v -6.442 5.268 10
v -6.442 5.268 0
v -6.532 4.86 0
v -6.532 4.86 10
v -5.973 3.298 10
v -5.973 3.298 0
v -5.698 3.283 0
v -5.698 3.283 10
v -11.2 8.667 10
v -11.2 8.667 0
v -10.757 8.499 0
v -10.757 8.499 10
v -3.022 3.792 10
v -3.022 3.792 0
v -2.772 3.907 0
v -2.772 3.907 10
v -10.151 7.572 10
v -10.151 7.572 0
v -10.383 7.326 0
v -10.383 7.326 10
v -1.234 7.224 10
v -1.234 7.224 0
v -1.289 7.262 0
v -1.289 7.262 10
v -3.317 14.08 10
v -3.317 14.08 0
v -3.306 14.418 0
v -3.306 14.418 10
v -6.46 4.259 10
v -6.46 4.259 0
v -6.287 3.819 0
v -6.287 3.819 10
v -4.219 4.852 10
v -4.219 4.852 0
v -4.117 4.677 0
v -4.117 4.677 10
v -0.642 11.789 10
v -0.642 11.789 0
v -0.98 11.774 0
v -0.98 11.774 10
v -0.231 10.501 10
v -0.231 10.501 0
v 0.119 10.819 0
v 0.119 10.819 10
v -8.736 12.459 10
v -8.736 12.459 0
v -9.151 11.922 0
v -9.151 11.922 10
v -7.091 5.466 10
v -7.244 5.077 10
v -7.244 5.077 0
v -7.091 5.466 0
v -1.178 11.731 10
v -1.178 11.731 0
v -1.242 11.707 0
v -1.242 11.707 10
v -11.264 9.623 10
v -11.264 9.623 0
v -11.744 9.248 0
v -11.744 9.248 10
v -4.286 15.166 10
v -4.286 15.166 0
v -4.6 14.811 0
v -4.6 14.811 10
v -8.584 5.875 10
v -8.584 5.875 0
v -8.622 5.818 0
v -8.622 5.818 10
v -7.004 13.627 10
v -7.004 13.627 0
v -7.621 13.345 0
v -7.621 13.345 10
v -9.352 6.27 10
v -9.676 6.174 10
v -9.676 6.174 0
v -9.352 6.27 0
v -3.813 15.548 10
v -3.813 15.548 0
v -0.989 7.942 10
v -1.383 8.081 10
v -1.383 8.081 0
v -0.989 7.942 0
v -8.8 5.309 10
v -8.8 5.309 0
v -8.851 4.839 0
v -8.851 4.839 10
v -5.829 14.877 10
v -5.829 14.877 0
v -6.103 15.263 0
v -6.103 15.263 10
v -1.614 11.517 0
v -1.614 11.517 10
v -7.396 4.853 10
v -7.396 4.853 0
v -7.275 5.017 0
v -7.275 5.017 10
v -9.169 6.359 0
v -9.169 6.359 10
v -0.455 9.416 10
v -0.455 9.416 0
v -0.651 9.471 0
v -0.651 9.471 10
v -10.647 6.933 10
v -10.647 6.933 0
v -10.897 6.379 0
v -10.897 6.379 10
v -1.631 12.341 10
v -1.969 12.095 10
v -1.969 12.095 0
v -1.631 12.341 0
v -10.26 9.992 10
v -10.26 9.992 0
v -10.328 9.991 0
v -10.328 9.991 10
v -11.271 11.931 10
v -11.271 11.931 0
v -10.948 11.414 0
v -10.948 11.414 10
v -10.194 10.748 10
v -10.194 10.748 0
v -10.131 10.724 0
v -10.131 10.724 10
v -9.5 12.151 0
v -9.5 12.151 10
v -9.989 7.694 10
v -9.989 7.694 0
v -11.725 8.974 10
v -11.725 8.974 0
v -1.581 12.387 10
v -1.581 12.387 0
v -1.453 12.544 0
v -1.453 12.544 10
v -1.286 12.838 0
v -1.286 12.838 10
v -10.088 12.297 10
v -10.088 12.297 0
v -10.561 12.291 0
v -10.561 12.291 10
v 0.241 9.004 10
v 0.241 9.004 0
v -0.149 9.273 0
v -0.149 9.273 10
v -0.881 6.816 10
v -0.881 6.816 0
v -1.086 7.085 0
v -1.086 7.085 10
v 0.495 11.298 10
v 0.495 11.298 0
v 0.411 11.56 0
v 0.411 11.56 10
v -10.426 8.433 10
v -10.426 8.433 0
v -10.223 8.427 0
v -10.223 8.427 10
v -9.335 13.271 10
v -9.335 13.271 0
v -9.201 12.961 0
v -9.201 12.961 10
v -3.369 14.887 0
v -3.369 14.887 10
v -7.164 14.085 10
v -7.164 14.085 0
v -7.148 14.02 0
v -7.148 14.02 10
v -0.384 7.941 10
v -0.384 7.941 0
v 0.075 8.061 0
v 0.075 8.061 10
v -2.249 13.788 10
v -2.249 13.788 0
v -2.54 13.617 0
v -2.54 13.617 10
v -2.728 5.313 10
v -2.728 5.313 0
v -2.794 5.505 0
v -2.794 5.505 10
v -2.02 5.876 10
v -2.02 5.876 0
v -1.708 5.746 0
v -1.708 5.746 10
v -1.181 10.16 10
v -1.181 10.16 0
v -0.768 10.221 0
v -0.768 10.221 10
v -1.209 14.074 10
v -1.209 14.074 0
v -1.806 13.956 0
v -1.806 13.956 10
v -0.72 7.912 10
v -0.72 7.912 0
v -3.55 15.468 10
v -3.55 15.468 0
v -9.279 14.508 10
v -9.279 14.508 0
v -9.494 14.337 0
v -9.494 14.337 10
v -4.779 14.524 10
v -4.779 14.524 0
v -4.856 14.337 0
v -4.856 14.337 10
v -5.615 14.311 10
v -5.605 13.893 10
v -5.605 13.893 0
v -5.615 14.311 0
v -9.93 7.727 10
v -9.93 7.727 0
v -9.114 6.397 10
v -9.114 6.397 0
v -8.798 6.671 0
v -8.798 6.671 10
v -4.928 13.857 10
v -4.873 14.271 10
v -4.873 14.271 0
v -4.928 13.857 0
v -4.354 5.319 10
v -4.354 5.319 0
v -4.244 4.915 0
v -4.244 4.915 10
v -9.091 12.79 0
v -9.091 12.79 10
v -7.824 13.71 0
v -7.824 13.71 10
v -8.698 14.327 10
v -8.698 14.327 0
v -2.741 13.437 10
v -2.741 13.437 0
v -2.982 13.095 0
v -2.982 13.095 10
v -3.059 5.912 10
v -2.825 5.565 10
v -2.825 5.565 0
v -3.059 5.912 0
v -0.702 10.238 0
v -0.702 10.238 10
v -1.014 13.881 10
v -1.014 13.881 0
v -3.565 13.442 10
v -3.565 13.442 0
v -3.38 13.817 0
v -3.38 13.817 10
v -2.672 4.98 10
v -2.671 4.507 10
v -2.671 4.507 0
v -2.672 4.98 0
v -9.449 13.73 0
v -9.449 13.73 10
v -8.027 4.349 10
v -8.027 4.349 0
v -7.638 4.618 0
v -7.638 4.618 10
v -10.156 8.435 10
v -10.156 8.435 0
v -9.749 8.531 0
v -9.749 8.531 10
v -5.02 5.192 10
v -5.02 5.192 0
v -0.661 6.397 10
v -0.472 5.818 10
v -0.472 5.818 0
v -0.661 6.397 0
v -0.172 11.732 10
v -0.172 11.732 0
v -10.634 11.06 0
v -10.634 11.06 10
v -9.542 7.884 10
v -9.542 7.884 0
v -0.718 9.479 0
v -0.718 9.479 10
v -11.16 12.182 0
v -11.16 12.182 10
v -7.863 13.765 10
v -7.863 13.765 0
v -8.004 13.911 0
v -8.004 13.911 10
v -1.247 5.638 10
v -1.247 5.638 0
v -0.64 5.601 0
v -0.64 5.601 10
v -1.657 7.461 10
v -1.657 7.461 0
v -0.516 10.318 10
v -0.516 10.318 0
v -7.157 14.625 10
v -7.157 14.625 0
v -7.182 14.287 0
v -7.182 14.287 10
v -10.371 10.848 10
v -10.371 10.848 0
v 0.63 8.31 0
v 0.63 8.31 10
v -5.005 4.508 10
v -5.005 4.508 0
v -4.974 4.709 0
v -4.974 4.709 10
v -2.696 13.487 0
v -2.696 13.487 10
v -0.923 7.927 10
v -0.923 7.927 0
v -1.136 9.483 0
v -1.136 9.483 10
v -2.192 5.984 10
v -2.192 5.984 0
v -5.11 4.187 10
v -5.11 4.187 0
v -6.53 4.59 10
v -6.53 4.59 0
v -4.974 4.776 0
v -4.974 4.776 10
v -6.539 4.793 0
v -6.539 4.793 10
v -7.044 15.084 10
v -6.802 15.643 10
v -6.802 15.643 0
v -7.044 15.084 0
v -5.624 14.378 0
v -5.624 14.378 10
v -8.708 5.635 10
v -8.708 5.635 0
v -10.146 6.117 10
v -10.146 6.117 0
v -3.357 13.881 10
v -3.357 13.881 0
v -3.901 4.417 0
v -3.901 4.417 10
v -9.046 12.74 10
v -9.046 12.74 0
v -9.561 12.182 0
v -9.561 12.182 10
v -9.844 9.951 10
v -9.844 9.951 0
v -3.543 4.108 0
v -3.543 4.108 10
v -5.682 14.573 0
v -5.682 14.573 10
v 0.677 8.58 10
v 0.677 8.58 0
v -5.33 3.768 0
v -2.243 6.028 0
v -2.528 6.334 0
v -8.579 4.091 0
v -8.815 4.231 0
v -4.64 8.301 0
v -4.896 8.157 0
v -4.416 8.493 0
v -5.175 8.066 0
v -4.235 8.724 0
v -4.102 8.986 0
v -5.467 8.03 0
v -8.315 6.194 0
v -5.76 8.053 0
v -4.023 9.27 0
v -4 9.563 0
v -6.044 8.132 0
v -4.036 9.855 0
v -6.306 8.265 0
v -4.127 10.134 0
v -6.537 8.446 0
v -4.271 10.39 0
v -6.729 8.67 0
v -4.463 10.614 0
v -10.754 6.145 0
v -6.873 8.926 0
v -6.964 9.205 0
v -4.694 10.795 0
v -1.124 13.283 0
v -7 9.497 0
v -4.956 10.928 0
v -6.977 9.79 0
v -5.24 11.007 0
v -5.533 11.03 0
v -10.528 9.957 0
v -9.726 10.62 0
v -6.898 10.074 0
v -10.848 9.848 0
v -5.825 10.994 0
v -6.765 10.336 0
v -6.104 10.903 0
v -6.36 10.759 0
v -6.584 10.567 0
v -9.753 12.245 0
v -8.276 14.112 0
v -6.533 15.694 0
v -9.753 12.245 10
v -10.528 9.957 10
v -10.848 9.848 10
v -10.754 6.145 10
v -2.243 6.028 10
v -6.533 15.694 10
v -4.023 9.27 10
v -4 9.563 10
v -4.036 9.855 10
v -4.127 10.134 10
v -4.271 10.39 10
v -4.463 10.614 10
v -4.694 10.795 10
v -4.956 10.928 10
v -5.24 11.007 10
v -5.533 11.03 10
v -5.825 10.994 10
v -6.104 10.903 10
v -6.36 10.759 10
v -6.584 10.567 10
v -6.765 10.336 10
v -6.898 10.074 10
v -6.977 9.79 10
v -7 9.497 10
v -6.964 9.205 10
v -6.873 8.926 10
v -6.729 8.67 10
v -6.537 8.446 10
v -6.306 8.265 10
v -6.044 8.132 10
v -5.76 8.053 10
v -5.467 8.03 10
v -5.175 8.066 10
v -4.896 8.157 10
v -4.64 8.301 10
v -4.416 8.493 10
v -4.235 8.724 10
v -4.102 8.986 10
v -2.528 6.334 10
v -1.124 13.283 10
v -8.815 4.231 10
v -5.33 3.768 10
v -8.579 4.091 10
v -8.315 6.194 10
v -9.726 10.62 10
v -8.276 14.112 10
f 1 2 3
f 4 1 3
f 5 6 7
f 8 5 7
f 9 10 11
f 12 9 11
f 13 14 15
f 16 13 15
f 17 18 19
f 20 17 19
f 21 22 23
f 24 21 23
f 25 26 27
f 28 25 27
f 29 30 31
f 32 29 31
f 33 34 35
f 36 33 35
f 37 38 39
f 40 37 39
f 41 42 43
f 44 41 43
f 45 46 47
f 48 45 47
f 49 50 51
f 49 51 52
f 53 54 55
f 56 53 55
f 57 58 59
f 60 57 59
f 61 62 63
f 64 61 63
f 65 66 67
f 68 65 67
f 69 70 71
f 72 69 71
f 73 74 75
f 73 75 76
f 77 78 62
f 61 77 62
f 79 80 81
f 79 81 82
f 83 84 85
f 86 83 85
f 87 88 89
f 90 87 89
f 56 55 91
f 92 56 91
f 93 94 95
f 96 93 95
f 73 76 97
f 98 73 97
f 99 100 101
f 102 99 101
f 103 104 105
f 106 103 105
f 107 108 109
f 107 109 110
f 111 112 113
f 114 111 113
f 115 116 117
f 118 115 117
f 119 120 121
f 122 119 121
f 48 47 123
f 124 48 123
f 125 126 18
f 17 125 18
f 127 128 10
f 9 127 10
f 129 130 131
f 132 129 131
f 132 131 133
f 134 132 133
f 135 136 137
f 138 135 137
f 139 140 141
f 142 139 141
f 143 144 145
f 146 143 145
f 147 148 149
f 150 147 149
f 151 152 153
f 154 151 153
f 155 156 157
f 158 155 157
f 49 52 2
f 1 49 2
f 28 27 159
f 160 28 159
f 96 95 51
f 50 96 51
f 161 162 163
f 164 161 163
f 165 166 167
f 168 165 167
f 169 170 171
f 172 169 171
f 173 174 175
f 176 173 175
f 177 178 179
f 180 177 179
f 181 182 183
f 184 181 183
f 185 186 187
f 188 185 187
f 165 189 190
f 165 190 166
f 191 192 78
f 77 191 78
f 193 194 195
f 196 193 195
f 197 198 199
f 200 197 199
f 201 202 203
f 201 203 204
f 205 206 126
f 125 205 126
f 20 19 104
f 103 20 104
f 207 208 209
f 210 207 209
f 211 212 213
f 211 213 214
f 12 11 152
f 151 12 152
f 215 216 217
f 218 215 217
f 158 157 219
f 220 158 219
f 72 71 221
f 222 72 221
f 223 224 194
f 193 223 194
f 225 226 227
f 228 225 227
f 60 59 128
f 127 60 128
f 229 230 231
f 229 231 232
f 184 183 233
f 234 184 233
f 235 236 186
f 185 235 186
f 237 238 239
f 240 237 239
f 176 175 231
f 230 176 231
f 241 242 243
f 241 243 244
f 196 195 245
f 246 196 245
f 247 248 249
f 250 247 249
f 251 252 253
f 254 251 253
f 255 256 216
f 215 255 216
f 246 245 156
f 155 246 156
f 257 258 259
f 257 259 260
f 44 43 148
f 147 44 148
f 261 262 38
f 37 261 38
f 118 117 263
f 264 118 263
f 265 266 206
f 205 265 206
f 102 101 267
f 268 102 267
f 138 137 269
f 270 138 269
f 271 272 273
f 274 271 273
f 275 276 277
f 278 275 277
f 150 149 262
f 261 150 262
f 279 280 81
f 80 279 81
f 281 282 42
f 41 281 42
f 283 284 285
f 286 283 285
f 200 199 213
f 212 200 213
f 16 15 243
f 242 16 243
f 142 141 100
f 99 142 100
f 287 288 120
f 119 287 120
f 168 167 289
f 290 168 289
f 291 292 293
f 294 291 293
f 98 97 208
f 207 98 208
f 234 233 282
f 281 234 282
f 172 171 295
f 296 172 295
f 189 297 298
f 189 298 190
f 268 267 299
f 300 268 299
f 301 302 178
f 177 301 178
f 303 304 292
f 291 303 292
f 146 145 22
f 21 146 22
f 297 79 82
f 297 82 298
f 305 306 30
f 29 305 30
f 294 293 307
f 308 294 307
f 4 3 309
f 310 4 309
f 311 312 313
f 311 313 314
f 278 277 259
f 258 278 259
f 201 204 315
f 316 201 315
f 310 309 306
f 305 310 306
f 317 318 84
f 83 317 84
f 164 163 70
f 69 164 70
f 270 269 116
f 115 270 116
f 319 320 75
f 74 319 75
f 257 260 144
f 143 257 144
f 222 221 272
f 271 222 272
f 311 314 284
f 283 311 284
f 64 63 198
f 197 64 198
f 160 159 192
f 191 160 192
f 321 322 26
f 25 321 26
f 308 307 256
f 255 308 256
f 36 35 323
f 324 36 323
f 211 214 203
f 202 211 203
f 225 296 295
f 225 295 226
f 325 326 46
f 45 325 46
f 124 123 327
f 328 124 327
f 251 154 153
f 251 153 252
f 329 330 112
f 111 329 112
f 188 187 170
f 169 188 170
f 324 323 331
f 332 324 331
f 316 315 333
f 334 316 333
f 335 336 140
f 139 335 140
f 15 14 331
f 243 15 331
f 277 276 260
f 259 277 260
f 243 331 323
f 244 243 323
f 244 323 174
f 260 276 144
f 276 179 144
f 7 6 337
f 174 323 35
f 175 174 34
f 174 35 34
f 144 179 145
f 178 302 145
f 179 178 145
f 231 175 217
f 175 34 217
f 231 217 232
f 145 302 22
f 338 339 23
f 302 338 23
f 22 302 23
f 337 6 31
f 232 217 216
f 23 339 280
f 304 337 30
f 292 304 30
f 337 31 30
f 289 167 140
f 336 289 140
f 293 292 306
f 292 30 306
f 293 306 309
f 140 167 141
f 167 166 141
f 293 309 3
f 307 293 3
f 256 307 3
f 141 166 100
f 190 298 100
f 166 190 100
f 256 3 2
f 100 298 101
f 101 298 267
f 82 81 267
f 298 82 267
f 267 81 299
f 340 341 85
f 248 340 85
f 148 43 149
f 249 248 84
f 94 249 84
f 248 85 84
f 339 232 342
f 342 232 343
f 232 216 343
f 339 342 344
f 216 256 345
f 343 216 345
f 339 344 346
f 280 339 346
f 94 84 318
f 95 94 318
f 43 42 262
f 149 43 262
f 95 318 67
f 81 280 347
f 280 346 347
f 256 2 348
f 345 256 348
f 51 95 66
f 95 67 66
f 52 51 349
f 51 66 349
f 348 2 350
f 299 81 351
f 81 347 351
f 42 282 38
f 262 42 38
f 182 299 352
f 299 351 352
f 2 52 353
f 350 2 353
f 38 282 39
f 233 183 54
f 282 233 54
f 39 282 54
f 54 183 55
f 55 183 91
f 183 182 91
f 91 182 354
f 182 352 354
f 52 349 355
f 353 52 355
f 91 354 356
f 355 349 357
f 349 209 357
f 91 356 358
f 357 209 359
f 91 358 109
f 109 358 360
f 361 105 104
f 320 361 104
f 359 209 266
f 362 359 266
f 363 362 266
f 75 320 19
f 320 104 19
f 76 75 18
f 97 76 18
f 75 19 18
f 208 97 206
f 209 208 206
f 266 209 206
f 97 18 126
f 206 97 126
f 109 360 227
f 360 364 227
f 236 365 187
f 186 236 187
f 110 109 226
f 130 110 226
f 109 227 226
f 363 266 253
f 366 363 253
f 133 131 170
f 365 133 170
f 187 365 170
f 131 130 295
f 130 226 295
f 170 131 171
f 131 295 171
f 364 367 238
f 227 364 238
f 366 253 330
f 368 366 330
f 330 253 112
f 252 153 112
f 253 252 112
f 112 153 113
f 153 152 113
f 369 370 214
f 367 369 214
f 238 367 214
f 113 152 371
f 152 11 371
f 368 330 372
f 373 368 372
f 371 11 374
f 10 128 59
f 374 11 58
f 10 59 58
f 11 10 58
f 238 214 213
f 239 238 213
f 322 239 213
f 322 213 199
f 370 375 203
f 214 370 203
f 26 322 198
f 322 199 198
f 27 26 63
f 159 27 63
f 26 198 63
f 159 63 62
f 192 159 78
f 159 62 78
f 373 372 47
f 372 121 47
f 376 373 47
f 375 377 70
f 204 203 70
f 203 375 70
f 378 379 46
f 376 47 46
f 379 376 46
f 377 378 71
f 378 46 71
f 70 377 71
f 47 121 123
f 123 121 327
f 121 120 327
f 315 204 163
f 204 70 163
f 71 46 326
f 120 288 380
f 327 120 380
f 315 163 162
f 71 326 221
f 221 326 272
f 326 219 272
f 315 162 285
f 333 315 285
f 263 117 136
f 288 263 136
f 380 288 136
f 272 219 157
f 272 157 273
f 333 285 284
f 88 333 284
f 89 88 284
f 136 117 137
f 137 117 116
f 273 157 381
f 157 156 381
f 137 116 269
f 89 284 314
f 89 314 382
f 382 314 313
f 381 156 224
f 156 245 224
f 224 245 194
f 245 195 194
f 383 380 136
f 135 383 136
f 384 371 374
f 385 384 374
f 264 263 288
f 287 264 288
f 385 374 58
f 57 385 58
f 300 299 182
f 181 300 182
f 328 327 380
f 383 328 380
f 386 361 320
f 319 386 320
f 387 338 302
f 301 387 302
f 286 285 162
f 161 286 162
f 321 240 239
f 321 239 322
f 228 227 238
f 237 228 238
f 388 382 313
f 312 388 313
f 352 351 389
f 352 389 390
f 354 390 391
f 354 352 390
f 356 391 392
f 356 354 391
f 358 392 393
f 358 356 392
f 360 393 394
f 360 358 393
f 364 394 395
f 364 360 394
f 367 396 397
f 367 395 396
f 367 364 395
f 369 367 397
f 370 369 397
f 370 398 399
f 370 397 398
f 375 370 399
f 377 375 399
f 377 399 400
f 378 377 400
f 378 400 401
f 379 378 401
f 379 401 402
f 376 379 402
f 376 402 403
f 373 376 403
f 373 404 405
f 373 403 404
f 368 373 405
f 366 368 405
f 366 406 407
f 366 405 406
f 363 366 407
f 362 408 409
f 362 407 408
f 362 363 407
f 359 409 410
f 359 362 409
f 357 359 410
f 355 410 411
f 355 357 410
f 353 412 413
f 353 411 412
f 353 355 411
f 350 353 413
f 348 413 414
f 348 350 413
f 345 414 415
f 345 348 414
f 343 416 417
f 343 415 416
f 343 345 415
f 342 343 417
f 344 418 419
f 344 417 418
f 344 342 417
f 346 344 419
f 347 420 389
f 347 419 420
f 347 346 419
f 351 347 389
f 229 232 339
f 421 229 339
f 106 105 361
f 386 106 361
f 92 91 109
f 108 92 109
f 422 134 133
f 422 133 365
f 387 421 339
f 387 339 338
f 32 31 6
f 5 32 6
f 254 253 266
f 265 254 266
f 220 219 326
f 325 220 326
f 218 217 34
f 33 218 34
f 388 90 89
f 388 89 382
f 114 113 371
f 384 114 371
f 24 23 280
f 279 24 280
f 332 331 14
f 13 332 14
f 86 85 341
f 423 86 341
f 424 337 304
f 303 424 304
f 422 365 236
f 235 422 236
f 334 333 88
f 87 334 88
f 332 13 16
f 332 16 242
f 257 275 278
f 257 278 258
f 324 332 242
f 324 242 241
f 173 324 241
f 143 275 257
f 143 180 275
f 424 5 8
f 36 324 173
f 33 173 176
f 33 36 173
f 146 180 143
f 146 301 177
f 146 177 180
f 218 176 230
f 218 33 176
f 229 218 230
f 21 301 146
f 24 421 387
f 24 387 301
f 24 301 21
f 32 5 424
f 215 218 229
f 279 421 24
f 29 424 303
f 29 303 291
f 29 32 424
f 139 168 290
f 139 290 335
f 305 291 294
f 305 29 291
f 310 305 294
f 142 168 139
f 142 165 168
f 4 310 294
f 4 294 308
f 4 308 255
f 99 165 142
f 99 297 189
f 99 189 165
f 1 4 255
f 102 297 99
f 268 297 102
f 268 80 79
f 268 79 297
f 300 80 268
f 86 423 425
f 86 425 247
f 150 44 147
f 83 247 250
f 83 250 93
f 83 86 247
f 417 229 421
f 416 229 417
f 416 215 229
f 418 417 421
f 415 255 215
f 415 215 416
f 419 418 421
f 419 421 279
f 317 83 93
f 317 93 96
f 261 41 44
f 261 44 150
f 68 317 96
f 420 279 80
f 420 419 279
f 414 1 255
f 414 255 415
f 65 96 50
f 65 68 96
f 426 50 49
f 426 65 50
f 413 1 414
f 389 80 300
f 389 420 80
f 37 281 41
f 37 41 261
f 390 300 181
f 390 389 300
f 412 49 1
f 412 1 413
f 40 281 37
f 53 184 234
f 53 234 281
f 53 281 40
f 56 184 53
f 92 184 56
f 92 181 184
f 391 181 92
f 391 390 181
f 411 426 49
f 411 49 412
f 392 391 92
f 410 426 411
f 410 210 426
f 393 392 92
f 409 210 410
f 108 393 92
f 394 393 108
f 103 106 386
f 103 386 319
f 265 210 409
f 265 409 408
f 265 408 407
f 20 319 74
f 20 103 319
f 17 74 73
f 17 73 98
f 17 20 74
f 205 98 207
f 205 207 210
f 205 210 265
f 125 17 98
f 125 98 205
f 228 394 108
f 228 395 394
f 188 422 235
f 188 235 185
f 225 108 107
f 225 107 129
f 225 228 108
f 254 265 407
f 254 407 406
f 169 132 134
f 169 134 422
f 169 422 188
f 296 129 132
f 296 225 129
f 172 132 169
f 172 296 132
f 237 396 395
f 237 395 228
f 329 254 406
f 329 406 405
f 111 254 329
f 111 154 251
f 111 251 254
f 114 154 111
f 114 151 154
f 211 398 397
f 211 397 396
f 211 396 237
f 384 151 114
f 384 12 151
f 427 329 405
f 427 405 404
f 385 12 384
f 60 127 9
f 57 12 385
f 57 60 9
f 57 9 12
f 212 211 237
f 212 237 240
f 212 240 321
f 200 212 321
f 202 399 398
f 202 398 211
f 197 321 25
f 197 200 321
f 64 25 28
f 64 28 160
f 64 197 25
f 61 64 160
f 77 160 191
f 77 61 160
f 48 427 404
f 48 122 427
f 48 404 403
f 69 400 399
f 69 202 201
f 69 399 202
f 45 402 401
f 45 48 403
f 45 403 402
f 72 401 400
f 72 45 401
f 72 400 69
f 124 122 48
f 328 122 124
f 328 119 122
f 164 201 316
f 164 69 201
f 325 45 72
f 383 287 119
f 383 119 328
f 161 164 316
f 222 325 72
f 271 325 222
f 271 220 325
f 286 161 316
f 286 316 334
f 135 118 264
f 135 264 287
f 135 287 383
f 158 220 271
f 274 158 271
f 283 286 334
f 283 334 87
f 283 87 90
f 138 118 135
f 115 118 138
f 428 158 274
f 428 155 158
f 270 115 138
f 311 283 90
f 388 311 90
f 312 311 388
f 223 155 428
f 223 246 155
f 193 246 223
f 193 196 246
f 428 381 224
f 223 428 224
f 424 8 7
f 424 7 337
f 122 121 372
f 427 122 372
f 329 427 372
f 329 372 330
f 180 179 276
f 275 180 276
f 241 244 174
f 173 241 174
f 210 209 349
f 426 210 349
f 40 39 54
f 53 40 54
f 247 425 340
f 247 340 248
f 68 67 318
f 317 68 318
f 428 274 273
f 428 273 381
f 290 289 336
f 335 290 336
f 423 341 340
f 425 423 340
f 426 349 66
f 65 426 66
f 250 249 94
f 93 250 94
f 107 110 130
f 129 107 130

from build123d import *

# Parameters (mm, degrees)
CYLINDER006_R                 = 1.5
CYLINDER006_DEPTH             = 12
LINEAREXTRUDE004_DEPTH        = 10
DIFFERENCE005_PLACEMENT_ANGLE = -10


with BuildPart() as cylinder006:
    # cylinder006 → cylinder006 (new body)
    with BuildSketch(Plane.XY.offset(-1)):
        Circle(CYLINDER006_R)
    extrude(amount=CYLINDER006_DEPTH)


with BuildPart() as difference005:
    # union006 → LinearExtrude004 (new body)
    with BuildSketch(Plane(origin=(0, 0, 0), x_dir=(0, 1, 0), z_dir=(0, 0, 1))):
        Polygon((0.711931, -4.306123), (1.370771, -4.143733), (1.502069, -4.540636), (1.530367, -4.602072), (1.641751, -4.771632), (1.871155, -5.020002), (2.245545, -5.309618), (2.782207, -5.596589), (3.025427, -5.468937), (3.094113, -4.864255), (3.068442, -4.391617), (2.994354, -4.061731), (2.918082, -3.873743), (2.883597, -3.815555), (2.631538, -3.482032), (3.139447, -3.032064), (3.440155, -3.322487), (3.493763, -3.363735), (3.671187, -3.46211), (3.989737, -3.575421), (4.455834, -3.657875), (5.064387, -3.662577), (5.220426, -3.436516), (5.000234, -2.869177), (4.757857, -2.462607), (4.53895, -2.204938), (4.384052, -2.073928), (4.326475, -2.038431), (3.948292, -1.860249), (4.188912, -1.225786), (4.590143, -1.343197), (4.656779, -1.354807), (4.859597, -1.359461), (5.194318, -1.311756), (5.645345, -1.168159), (6.186377, -0.889514), (6.219486, -0.616832), (5.76086, -0.216806), (5.357304, 0.030555), (5.043726, 0.156979), (4.845688, 0.200998), (4.77821, 0.205671), (4.36054, 0.187693), (4.278749, 0.861305), (4.688584, 0.943805), (4.752983, 0.964491), (4.934732, 1.054624), (5.208943, 1.252418), (5.541575, 1.58917), (5.891142, 2.087328), (5.793738, 2.344162), (5.201743, 2.485233), (4.729457, 2.516719), (4.393046, 2.482935), (4.197235, 2.429879), (4.135314, 2.402658), (3.773841, 2.192639), (3.388376, 2.751081), (3.712928, 3.01459), (3.760337, 3.062835), (3.879381, 3.227107), (4.030263, 3.529677), (4.168298, 3.982437), (4.246318, 4.585986), (4.040715, 4.768136), (3.45097, 4.617935), (3.018149, 4.426332), (2.735972, 4.240079), (2.587247, 4.102103), (2.545069, 4.049224), (2.322601, 3.695276), (1.721767, 4.010618), (1.886685, 4.394771), (1.906243, 4.459522), (1.93531, 4.6603), (1.928298, 4.99833), (1.840114, 5.463378), (1.628715, 6.034052), (1.362012, 6.099788), (0.909622, 5.692724), (0.61542, 5.321926), (0.452121, 5.025874), (0.384552, 4.834585), (0.371779, 4.768162), (0.339281, 4.351371), (-0.339281, 4.351371), (-0.371779, 4.768162), (-0.384552, 4.834585), (-0.452121, 5.025874), (-0.61542, 5.321926), (-0.909622, 5.692724), (-1.362012, 6.099788), (-1.628715, 6.034052), (-1.840114, 5.463378), (-1.928298, 4.99833), (-1.93531, 4.6603), (-1.906243, 4.459522), (-1.886685, 4.394771), (-1.721767, 4.010618), (-2.322601, 3.695276), (-2.545069, 4.049224), (-2.587247, 4.102103), (-2.735972, 4.240079), (-3.018149, 4.426332), (-3.45097, 4.617935), (-4.040715, 4.768136), (-4.246318, 4.585986), (-4.168298, 3.982437), (-4.030263, 3.529677), (-3.879381, 3.227107), (-3.760337, 3.062835), (-3.712928, 3.01459), (-3.388376, 2.751081), (-3.773841, 2.192638), (-4.135314, 2.402658), (-4.197235, 2.429879), (-4.393046, 2.482935), (-4.729457, 2.516719), (-5.201743, 2.485233), (-5.793738, 2.344162), (-5.891142, 2.087328), (-5.541575, 1.58917), (-5.208943, 1.252418), (-4.934732, 1.054624), (-4.752983, 0.964491), (-4.688584, 0.943805), (-4.278749, 0.861305), (-4.36054, 0.187693), (-4.77821, 0.205671), (-4.845688, 0.200998), (-5.043726, 0.156979), (-5.357304, 0.030555), (-5.76086, -0.216806), (-6.219486, -0.616832), (-6.186377, -0.889514), (-5.645345, -1.168159), (-5.194318, -1.311756), (-4.859597, -1.359461), (-4.656779, -1.354807), (-4.590143, -1.343197), (-4.188912, -1.225786), (-3.948292, -1.860249), (-4.326475, -2.038431), (-4.384052, -2.073928), (-4.53895, -2.204938), (-4.757857, -2.462607), (-5.000234, -2.869177), (-5.220426, -3.436516), (-5.064387, -3.662577), (-4.455834, -3.657875), (-3.989737, -3.575421), (-3.671187, -3.46211), (-3.493763, -3.363735), (-3.440155, -3.322487), (-3.139447, -3.032064), (-2.631537, -3.482032), (-2.883597, -3.815555), (-2.918082, -3.873743), (-2.994354, -4.061731), (-3.068442, -4.391617), (-3.094113, -4.864255), (-3.025427, -5.468937), (-2.782207, -5.596589), (-2.245545, -5.309618), (-1.871155, -5.020002), (-1.641751, -4.771632), (-1.530367, -4.602072), (-1.502069, -4.540636), (-1.370771, -4.143733), (-0.71193, -4.306122), (-0.780122, -4.71858), (-0.783616, -4.78613), (-0.763789, -4.98803), (-0.676085, -5.31456), (-0.47917, -5.74499), (-0.137342, -6.24849), (0.137342, -6.24849), (0.47917, -5.74499), (0.676085, -5.31456), (0.763789, -4.98803), (0.783616, -4.78613), (0.780122, -4.71858), align=None)
    extrude(amount=LINEAREXTRUDE004_DEPTH)

    # difference005: cut cylinder006
    add(cylinder006.part, mode=Mode.SUBTRACT)


with BuildPart() as difference005_1:
    # difference005 placement: moved
    add(difference005.part.moved(Location((-5.5, 9.53, 0))).rotate(Axis((-5.5, 9.53, 0), (0, 0, 1)), DIFFERENCE005_PLACEMENT_ANGLE))


solid = difference005_1.part
